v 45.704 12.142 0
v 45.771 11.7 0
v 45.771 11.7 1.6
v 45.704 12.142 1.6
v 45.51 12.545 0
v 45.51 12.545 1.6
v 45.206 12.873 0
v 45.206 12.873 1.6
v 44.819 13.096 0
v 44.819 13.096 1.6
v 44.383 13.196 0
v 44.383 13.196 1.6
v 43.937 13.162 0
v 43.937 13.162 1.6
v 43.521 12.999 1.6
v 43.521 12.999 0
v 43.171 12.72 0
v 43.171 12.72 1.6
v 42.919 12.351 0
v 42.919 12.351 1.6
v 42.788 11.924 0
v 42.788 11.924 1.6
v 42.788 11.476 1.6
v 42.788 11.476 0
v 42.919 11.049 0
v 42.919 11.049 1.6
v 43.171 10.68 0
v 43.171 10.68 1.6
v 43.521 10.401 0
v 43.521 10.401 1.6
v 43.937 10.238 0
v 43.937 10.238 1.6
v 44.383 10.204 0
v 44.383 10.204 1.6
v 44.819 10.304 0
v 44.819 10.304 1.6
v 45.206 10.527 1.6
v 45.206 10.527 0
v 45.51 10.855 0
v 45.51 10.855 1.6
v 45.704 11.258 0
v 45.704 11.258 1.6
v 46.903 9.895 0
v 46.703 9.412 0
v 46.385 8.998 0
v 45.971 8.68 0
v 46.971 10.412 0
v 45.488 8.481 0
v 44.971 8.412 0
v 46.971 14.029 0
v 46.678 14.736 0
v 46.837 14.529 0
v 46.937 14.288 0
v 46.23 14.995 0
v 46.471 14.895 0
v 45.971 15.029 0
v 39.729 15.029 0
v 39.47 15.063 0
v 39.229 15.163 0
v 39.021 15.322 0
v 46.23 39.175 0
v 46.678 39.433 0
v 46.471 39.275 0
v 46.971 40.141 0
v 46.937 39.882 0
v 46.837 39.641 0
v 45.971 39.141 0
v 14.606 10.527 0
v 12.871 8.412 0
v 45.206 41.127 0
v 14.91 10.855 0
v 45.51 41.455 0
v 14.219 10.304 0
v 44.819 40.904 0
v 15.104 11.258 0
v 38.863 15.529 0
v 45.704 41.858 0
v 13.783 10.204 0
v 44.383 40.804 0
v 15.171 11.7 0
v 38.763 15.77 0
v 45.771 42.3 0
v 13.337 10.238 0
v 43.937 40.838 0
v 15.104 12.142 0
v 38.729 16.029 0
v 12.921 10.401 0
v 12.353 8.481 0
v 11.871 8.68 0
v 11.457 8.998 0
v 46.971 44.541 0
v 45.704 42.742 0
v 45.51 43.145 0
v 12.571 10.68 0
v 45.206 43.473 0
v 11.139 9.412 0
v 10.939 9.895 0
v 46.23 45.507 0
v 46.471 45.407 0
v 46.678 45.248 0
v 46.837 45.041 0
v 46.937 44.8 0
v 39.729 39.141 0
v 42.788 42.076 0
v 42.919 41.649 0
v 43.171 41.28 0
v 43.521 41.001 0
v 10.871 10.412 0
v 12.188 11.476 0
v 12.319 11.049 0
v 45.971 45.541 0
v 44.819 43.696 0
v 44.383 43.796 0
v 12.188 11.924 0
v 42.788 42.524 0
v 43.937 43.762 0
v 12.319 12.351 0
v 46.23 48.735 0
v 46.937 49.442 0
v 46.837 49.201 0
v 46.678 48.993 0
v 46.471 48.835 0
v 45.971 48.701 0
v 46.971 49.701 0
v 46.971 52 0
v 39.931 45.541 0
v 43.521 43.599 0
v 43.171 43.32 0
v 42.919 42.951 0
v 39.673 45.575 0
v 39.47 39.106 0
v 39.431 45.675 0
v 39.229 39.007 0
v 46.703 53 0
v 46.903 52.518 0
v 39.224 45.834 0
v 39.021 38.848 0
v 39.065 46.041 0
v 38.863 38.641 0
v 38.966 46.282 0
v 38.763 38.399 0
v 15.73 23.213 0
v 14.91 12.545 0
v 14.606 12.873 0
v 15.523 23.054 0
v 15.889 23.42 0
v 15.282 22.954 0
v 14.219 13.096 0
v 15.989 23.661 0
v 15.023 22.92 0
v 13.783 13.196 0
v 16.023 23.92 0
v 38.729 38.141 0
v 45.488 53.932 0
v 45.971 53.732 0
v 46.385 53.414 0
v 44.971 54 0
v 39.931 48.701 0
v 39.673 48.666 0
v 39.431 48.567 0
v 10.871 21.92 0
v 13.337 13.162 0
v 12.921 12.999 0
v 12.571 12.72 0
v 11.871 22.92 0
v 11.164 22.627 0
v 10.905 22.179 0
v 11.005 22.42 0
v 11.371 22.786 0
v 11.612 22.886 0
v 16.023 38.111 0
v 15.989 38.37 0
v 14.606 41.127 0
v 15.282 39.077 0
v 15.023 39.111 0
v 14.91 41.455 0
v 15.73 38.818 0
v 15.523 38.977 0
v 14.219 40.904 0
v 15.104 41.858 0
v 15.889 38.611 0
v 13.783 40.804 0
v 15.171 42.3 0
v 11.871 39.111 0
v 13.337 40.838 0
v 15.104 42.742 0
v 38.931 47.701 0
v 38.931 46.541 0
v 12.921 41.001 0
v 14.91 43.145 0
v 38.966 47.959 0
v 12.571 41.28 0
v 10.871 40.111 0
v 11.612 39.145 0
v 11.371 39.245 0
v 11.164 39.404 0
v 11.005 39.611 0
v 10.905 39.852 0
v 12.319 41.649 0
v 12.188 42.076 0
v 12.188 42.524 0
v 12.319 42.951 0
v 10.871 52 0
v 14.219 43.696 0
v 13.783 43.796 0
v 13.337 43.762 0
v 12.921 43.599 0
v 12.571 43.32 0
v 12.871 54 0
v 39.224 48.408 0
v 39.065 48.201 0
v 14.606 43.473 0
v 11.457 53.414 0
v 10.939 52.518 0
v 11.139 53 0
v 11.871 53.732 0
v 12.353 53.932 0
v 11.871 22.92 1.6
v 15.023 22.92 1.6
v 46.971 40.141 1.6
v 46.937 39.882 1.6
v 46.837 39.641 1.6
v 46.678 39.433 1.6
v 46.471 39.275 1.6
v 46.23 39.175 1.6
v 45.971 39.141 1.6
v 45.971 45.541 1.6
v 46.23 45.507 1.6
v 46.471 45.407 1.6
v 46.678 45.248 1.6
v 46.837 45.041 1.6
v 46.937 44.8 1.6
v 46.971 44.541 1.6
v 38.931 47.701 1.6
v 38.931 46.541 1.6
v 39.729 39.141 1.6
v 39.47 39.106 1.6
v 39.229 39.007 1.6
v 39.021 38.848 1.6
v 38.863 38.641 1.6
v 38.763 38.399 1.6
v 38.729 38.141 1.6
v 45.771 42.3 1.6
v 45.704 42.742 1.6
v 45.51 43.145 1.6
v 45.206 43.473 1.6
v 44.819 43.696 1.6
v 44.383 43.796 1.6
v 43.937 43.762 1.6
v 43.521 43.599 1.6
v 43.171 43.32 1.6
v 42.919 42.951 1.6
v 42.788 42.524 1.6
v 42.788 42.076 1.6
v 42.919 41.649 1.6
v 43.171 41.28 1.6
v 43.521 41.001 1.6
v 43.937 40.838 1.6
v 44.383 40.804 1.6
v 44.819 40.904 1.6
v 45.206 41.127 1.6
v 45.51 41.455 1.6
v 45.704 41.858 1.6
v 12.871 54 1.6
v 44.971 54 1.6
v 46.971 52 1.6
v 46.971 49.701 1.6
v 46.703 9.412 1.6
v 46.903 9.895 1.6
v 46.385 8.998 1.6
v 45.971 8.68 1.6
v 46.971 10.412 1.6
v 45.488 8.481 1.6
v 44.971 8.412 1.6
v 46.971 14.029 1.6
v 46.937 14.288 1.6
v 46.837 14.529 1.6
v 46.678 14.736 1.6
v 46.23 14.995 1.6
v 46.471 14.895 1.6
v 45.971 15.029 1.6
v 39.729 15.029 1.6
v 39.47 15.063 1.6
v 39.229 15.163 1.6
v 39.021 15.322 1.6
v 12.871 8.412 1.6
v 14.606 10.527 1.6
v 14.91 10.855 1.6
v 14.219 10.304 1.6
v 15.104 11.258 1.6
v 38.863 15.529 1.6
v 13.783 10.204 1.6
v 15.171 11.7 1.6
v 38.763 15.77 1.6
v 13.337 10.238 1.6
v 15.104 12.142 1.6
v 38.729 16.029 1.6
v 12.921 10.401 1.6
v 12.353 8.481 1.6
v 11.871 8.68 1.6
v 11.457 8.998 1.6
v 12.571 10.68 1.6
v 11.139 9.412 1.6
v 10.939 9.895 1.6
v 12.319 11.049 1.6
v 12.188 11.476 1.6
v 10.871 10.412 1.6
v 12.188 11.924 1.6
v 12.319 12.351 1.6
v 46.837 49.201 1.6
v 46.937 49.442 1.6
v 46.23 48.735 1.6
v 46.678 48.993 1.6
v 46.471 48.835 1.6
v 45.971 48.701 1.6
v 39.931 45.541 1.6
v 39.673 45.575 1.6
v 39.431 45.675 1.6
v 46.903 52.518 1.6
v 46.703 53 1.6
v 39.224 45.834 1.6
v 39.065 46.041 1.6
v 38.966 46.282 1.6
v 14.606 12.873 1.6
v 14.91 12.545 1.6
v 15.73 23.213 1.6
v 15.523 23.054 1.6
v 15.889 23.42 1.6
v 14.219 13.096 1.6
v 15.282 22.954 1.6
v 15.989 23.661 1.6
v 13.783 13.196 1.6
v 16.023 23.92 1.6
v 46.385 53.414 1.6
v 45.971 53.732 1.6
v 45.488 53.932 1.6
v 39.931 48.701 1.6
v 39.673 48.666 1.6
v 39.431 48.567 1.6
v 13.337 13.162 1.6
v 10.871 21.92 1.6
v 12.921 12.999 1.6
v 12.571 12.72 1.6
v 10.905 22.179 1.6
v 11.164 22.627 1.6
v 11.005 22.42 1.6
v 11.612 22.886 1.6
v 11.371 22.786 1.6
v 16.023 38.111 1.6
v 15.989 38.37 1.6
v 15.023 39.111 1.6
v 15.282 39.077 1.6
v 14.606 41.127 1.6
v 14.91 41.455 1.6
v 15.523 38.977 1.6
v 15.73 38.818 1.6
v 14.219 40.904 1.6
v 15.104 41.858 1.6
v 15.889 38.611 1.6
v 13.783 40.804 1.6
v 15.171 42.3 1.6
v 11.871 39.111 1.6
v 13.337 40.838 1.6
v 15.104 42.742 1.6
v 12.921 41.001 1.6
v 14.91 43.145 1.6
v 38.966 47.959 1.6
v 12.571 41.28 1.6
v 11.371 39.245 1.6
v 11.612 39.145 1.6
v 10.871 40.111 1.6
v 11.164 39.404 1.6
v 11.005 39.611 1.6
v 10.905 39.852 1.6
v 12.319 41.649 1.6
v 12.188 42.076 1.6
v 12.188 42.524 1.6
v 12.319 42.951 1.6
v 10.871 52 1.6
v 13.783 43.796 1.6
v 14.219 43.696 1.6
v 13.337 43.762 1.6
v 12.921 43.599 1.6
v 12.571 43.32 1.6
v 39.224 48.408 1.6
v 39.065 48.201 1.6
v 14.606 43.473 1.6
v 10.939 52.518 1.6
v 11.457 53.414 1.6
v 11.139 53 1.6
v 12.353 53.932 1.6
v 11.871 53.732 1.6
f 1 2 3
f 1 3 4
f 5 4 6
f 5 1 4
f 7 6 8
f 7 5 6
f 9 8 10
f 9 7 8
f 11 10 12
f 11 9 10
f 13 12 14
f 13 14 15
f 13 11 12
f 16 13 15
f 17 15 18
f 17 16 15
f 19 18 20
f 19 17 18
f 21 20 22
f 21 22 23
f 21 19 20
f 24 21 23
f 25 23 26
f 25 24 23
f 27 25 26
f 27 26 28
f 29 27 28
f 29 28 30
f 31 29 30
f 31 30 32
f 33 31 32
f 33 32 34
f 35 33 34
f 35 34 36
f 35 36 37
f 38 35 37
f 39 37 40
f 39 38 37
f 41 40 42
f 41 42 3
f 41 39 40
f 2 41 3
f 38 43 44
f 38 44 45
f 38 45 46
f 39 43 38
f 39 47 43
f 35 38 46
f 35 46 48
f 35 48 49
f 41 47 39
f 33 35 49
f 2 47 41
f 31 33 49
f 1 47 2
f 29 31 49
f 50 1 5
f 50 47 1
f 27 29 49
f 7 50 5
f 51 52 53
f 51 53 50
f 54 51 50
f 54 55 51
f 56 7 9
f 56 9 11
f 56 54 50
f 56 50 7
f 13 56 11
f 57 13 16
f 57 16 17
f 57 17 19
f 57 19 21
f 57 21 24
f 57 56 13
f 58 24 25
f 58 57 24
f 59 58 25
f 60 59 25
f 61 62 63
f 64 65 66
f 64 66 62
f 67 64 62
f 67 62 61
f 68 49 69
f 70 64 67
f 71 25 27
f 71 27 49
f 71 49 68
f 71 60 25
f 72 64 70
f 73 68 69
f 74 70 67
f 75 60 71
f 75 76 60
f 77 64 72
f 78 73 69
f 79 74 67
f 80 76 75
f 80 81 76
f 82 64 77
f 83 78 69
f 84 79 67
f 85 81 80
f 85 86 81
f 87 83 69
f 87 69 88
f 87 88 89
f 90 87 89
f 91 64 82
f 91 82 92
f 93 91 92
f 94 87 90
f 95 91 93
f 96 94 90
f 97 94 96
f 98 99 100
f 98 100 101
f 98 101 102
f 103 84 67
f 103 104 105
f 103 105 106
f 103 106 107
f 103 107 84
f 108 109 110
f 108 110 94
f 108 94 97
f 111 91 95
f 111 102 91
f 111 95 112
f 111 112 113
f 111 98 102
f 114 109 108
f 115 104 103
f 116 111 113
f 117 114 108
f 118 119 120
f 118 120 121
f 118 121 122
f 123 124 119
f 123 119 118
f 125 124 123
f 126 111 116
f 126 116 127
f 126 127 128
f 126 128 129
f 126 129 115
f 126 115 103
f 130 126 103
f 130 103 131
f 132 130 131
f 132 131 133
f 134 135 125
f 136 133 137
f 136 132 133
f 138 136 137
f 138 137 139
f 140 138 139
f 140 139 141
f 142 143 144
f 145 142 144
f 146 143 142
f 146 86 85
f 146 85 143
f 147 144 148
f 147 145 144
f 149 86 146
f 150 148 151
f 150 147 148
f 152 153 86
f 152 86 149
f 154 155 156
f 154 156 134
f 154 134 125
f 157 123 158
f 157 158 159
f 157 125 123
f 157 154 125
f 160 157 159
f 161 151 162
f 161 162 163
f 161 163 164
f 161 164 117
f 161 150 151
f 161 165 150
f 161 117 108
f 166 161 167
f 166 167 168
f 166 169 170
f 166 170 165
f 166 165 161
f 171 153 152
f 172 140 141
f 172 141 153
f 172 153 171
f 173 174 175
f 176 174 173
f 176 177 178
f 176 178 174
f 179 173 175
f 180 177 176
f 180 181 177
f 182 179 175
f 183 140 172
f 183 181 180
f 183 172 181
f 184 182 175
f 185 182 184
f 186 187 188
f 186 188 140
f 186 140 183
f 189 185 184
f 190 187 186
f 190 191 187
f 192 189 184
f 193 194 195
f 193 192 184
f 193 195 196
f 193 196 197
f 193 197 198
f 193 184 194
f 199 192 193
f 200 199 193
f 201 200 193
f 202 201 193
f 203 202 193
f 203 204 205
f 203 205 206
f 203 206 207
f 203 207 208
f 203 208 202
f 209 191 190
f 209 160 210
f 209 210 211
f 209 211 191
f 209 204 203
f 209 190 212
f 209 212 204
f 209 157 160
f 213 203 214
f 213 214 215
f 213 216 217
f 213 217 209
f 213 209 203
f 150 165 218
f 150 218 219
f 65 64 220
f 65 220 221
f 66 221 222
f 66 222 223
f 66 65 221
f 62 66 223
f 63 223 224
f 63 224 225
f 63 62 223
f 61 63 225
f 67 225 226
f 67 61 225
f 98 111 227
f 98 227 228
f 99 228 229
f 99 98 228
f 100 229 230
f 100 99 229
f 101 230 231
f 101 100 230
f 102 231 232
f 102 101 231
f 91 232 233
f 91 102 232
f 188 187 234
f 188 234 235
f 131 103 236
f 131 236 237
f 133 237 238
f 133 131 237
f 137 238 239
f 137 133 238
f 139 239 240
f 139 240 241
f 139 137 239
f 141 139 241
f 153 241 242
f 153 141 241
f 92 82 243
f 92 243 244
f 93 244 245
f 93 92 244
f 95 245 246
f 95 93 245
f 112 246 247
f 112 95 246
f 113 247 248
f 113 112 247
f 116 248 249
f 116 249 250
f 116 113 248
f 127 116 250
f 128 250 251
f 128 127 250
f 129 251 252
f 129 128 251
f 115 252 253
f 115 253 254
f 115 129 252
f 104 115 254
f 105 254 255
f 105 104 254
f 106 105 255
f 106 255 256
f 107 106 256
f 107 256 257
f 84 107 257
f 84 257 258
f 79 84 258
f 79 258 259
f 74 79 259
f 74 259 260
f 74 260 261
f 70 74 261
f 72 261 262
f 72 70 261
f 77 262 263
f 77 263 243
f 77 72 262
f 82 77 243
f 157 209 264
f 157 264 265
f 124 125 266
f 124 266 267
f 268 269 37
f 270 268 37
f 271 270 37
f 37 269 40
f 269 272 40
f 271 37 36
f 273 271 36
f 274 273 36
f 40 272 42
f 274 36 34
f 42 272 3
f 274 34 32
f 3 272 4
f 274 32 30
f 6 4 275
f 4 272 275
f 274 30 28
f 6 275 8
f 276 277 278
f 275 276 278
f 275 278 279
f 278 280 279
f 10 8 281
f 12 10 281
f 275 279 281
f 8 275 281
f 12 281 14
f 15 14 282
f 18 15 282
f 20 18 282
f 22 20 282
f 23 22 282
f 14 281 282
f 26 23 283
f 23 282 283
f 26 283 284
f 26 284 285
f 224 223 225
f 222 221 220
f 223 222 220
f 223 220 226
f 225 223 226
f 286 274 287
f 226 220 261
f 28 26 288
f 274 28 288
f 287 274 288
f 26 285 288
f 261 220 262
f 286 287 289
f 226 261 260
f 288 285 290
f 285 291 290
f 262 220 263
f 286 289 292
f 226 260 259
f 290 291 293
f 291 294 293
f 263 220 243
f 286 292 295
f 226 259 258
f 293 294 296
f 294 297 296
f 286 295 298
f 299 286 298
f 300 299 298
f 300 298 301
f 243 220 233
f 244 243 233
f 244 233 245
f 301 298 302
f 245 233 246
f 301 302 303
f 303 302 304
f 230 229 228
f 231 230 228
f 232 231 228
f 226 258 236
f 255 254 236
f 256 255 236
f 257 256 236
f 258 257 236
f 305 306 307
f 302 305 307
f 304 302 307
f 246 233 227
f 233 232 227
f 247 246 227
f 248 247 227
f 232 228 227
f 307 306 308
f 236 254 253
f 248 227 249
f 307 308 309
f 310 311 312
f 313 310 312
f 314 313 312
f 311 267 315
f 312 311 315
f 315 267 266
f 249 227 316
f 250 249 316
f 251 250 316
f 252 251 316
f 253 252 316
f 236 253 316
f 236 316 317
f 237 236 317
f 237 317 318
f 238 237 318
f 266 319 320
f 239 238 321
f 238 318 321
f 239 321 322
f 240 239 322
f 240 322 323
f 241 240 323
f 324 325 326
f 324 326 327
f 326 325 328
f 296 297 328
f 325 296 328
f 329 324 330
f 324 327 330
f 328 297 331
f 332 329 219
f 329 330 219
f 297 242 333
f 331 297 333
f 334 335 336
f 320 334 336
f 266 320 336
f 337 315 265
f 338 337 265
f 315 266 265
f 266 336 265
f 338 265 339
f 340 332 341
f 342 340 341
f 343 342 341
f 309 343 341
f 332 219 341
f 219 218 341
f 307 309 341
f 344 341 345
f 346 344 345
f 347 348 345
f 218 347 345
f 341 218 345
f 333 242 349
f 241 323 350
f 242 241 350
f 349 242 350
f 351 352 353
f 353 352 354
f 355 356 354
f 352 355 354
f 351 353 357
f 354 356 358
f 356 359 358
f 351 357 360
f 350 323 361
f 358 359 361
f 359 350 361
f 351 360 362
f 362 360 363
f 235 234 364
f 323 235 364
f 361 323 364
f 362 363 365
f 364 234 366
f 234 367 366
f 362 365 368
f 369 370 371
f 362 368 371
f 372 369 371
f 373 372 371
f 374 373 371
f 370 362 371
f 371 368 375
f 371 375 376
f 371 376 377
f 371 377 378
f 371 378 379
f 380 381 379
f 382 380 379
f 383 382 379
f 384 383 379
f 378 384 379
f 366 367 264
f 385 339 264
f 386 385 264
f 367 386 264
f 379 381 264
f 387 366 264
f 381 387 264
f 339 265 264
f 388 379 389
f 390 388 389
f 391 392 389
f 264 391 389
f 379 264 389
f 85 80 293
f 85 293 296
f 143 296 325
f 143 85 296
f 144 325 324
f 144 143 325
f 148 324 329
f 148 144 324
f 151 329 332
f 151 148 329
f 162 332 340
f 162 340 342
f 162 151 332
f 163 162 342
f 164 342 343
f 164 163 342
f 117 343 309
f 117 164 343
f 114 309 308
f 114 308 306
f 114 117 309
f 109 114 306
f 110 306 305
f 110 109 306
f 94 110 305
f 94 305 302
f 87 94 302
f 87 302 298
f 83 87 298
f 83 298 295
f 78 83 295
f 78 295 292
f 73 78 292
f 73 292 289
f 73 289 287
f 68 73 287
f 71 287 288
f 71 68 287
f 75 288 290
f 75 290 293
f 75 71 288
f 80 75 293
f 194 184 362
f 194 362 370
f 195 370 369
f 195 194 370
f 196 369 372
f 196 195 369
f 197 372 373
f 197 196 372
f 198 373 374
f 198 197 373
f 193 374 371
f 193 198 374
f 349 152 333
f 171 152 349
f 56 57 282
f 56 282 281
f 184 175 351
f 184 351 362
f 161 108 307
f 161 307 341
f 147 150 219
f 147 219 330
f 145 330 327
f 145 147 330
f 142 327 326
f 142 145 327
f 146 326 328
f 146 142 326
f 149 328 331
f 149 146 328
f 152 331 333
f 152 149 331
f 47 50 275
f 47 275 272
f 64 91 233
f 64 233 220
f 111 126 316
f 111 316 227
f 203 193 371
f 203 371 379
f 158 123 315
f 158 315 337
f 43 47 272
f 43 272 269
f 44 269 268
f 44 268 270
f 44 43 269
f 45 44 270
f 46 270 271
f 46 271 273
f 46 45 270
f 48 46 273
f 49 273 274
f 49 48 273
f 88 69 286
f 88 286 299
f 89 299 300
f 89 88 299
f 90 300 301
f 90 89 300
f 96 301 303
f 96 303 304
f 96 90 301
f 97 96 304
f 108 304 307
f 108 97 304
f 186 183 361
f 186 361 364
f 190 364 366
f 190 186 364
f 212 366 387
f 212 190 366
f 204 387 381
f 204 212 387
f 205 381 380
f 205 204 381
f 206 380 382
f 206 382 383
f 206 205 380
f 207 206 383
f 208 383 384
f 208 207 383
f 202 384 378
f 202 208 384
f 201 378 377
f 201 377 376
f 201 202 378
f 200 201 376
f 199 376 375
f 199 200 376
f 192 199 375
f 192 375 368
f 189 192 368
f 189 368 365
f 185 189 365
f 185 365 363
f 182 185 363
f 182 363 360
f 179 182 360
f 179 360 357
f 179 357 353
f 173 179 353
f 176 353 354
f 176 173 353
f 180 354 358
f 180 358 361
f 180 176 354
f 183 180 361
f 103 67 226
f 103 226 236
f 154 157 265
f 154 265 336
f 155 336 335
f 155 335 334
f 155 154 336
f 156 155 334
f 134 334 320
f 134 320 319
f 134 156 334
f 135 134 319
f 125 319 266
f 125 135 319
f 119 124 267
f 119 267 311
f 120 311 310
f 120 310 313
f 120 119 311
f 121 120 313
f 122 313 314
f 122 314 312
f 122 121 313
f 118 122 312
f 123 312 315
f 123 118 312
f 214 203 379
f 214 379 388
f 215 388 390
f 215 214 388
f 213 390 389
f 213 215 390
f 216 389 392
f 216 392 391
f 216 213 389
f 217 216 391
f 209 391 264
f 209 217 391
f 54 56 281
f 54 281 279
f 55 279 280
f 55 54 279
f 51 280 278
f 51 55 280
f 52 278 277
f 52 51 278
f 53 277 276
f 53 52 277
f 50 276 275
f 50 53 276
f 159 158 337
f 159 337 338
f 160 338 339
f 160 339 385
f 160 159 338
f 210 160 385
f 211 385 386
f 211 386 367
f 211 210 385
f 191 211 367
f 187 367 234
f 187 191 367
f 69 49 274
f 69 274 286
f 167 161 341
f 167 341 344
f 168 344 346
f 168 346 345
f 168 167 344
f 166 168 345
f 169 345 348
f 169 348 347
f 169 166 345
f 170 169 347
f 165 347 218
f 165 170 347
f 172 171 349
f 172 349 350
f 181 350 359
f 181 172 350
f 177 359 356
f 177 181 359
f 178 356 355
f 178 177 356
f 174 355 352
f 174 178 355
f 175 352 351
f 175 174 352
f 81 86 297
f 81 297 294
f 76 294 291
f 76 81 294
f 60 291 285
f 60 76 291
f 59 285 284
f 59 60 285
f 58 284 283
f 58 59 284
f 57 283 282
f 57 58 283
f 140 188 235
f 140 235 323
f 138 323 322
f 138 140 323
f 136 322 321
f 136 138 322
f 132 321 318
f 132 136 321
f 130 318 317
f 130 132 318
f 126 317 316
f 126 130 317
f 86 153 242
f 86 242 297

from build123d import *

# Parameters (mm, degrees)
BOARD3_R        = 1.5
EXTRUDE_4_DEPTH = 1.6


with BuildPart() as part:
    # Board3 → Бобышка-Вытянуть4 (new body)
    with BuildSketch(Plane.XY):
        with BuildLine():
            Line((12.870855766, 54), (44.970855766, 54))
            ThreePointArc((44.970855766, 54), (46.385069328, 53.414213562), (46.970855766, 52))
            Line((46.970855766, 52), (46.970855766, 49.700569912))
            ThreePointArc((46.970855766, 49.700569912), (46.677962547, 48.993463131), (45.970855766, 48.700569912))
            Line((45.970855766, 48.700569912), (39.93144499, 48.700569912))
            ThreePointArc((39.93144499, 48.700569912), (39.224338209, 48.407676693), (38.93144499, 47.700569912))
            Line((38.93144499, 47.700569912), (38.93144499, 46.541193448))
            ThreePointArc((38.93144499, 46.541193448), (39.224338209, 45.834086667), (39.93144499, 45.541193448))
            Line((39.93144499, 45.541193448), (45.970855766, 45.541193448))
            ThreePointArc((45.970855766, 45.541193448), (46.677962547, 45.248300229), (46.970855766, 44.541193448))
            Line((46.970855766, 44.541193448), (46.970855766, 40.140550153))
            ThreePointArc((46.970855766, 40.140550153), (46.677962547, 39.433443372), (45.970855766, 39.140550153))
            Line((45.970855766, 39.140550153), (39.728596312, 39.140550153))
            ThreePointArc((39.728596312, 39.140550153), (39.021489531, 38.847656935), (38.728596312, 38.140550153))
            Line((38.728596312, 38.140550153), (38.728596312, 16.029234453))
            ThreePointArc((38.728596312, 16.029234453), (39.021489531, 15.322127672), (39.728596312, 15.029234453))
            Line((39.728596312, 15.029234453), (45.970855766, 15.029234453))
            ThreePointArc((45.970855766, 15.029234453), (46.677962547, 14.736341234), (46.970855766, 14.029234453))
            Line((46.970855766, 14.029234453), (46.970855766, 10.412381856))
            ThreePointArc((46.970855766, 10.412381856), (46.385069328, 8.998168294), (44.970855766, 8.412381856))
            Line((44.970855766, 8.412381856), (12.870855766, 8.412381856))
            ThreePointArc((12.870855766, 8.412381856), (11.456642203, 8.998168294), (10.870855766, 10.412381856))
            Line((10.870855766, 10.412381856), (10.870855766, 21.919777804))
            ThreePointArc((10.870855766, 21.919777804), (11.163748985, 22.626884585), (11.870855766, 22.919777804))
            Line((11.870855766, 22.919777804), (15.023151862, 22.919777804))
            ThreePointArc((15.023151862, 22.919777804), (15.730258643, 23.212671023), (16.023151862, 23.919777804))
            Line((16.023151862, 23.919777804), (16.023151862, 38.110742779))
            ThreePointArc((16.023151862, 38.110742779), (15.730258643, 38.81784956), (15.023151862, 39.110742779))
            Line((15.023151862, 39.110742779), (11.870855766, 39.110742779))
            ThreePointArc((11.870855766, 39.110742779), (11.163748985, 39.403635998), (10.870855766, 40.110742779))
            Line((10.870855766, 40.110742779), (10.870855766, 52))
            ThreePointArc((10.870855766, 52), (11.456642203, 53.414213562), (12.870855766, 54))
        make_face()
        with Locations((13.670855766, 42.3)):
            Circle(BOARD3_R, mode=Mode.SUBTRACT)
        with Locations((44.270855766, 42.3)):
            Circle(BOARD3_R, mode=Mode.SUBTRACT)
        with Locations((13.670855766, 11.7)):
            Circle(BOARD3_R, mode=Mode.SUBTRACT)
        with Locations((44.270855766, 11.7)):
            Circle(BOARD3_R, mode=Mode.SUBTRACT)
    extrude(amount=EXTRUDE_4_DEPTH)


solid = part.part
